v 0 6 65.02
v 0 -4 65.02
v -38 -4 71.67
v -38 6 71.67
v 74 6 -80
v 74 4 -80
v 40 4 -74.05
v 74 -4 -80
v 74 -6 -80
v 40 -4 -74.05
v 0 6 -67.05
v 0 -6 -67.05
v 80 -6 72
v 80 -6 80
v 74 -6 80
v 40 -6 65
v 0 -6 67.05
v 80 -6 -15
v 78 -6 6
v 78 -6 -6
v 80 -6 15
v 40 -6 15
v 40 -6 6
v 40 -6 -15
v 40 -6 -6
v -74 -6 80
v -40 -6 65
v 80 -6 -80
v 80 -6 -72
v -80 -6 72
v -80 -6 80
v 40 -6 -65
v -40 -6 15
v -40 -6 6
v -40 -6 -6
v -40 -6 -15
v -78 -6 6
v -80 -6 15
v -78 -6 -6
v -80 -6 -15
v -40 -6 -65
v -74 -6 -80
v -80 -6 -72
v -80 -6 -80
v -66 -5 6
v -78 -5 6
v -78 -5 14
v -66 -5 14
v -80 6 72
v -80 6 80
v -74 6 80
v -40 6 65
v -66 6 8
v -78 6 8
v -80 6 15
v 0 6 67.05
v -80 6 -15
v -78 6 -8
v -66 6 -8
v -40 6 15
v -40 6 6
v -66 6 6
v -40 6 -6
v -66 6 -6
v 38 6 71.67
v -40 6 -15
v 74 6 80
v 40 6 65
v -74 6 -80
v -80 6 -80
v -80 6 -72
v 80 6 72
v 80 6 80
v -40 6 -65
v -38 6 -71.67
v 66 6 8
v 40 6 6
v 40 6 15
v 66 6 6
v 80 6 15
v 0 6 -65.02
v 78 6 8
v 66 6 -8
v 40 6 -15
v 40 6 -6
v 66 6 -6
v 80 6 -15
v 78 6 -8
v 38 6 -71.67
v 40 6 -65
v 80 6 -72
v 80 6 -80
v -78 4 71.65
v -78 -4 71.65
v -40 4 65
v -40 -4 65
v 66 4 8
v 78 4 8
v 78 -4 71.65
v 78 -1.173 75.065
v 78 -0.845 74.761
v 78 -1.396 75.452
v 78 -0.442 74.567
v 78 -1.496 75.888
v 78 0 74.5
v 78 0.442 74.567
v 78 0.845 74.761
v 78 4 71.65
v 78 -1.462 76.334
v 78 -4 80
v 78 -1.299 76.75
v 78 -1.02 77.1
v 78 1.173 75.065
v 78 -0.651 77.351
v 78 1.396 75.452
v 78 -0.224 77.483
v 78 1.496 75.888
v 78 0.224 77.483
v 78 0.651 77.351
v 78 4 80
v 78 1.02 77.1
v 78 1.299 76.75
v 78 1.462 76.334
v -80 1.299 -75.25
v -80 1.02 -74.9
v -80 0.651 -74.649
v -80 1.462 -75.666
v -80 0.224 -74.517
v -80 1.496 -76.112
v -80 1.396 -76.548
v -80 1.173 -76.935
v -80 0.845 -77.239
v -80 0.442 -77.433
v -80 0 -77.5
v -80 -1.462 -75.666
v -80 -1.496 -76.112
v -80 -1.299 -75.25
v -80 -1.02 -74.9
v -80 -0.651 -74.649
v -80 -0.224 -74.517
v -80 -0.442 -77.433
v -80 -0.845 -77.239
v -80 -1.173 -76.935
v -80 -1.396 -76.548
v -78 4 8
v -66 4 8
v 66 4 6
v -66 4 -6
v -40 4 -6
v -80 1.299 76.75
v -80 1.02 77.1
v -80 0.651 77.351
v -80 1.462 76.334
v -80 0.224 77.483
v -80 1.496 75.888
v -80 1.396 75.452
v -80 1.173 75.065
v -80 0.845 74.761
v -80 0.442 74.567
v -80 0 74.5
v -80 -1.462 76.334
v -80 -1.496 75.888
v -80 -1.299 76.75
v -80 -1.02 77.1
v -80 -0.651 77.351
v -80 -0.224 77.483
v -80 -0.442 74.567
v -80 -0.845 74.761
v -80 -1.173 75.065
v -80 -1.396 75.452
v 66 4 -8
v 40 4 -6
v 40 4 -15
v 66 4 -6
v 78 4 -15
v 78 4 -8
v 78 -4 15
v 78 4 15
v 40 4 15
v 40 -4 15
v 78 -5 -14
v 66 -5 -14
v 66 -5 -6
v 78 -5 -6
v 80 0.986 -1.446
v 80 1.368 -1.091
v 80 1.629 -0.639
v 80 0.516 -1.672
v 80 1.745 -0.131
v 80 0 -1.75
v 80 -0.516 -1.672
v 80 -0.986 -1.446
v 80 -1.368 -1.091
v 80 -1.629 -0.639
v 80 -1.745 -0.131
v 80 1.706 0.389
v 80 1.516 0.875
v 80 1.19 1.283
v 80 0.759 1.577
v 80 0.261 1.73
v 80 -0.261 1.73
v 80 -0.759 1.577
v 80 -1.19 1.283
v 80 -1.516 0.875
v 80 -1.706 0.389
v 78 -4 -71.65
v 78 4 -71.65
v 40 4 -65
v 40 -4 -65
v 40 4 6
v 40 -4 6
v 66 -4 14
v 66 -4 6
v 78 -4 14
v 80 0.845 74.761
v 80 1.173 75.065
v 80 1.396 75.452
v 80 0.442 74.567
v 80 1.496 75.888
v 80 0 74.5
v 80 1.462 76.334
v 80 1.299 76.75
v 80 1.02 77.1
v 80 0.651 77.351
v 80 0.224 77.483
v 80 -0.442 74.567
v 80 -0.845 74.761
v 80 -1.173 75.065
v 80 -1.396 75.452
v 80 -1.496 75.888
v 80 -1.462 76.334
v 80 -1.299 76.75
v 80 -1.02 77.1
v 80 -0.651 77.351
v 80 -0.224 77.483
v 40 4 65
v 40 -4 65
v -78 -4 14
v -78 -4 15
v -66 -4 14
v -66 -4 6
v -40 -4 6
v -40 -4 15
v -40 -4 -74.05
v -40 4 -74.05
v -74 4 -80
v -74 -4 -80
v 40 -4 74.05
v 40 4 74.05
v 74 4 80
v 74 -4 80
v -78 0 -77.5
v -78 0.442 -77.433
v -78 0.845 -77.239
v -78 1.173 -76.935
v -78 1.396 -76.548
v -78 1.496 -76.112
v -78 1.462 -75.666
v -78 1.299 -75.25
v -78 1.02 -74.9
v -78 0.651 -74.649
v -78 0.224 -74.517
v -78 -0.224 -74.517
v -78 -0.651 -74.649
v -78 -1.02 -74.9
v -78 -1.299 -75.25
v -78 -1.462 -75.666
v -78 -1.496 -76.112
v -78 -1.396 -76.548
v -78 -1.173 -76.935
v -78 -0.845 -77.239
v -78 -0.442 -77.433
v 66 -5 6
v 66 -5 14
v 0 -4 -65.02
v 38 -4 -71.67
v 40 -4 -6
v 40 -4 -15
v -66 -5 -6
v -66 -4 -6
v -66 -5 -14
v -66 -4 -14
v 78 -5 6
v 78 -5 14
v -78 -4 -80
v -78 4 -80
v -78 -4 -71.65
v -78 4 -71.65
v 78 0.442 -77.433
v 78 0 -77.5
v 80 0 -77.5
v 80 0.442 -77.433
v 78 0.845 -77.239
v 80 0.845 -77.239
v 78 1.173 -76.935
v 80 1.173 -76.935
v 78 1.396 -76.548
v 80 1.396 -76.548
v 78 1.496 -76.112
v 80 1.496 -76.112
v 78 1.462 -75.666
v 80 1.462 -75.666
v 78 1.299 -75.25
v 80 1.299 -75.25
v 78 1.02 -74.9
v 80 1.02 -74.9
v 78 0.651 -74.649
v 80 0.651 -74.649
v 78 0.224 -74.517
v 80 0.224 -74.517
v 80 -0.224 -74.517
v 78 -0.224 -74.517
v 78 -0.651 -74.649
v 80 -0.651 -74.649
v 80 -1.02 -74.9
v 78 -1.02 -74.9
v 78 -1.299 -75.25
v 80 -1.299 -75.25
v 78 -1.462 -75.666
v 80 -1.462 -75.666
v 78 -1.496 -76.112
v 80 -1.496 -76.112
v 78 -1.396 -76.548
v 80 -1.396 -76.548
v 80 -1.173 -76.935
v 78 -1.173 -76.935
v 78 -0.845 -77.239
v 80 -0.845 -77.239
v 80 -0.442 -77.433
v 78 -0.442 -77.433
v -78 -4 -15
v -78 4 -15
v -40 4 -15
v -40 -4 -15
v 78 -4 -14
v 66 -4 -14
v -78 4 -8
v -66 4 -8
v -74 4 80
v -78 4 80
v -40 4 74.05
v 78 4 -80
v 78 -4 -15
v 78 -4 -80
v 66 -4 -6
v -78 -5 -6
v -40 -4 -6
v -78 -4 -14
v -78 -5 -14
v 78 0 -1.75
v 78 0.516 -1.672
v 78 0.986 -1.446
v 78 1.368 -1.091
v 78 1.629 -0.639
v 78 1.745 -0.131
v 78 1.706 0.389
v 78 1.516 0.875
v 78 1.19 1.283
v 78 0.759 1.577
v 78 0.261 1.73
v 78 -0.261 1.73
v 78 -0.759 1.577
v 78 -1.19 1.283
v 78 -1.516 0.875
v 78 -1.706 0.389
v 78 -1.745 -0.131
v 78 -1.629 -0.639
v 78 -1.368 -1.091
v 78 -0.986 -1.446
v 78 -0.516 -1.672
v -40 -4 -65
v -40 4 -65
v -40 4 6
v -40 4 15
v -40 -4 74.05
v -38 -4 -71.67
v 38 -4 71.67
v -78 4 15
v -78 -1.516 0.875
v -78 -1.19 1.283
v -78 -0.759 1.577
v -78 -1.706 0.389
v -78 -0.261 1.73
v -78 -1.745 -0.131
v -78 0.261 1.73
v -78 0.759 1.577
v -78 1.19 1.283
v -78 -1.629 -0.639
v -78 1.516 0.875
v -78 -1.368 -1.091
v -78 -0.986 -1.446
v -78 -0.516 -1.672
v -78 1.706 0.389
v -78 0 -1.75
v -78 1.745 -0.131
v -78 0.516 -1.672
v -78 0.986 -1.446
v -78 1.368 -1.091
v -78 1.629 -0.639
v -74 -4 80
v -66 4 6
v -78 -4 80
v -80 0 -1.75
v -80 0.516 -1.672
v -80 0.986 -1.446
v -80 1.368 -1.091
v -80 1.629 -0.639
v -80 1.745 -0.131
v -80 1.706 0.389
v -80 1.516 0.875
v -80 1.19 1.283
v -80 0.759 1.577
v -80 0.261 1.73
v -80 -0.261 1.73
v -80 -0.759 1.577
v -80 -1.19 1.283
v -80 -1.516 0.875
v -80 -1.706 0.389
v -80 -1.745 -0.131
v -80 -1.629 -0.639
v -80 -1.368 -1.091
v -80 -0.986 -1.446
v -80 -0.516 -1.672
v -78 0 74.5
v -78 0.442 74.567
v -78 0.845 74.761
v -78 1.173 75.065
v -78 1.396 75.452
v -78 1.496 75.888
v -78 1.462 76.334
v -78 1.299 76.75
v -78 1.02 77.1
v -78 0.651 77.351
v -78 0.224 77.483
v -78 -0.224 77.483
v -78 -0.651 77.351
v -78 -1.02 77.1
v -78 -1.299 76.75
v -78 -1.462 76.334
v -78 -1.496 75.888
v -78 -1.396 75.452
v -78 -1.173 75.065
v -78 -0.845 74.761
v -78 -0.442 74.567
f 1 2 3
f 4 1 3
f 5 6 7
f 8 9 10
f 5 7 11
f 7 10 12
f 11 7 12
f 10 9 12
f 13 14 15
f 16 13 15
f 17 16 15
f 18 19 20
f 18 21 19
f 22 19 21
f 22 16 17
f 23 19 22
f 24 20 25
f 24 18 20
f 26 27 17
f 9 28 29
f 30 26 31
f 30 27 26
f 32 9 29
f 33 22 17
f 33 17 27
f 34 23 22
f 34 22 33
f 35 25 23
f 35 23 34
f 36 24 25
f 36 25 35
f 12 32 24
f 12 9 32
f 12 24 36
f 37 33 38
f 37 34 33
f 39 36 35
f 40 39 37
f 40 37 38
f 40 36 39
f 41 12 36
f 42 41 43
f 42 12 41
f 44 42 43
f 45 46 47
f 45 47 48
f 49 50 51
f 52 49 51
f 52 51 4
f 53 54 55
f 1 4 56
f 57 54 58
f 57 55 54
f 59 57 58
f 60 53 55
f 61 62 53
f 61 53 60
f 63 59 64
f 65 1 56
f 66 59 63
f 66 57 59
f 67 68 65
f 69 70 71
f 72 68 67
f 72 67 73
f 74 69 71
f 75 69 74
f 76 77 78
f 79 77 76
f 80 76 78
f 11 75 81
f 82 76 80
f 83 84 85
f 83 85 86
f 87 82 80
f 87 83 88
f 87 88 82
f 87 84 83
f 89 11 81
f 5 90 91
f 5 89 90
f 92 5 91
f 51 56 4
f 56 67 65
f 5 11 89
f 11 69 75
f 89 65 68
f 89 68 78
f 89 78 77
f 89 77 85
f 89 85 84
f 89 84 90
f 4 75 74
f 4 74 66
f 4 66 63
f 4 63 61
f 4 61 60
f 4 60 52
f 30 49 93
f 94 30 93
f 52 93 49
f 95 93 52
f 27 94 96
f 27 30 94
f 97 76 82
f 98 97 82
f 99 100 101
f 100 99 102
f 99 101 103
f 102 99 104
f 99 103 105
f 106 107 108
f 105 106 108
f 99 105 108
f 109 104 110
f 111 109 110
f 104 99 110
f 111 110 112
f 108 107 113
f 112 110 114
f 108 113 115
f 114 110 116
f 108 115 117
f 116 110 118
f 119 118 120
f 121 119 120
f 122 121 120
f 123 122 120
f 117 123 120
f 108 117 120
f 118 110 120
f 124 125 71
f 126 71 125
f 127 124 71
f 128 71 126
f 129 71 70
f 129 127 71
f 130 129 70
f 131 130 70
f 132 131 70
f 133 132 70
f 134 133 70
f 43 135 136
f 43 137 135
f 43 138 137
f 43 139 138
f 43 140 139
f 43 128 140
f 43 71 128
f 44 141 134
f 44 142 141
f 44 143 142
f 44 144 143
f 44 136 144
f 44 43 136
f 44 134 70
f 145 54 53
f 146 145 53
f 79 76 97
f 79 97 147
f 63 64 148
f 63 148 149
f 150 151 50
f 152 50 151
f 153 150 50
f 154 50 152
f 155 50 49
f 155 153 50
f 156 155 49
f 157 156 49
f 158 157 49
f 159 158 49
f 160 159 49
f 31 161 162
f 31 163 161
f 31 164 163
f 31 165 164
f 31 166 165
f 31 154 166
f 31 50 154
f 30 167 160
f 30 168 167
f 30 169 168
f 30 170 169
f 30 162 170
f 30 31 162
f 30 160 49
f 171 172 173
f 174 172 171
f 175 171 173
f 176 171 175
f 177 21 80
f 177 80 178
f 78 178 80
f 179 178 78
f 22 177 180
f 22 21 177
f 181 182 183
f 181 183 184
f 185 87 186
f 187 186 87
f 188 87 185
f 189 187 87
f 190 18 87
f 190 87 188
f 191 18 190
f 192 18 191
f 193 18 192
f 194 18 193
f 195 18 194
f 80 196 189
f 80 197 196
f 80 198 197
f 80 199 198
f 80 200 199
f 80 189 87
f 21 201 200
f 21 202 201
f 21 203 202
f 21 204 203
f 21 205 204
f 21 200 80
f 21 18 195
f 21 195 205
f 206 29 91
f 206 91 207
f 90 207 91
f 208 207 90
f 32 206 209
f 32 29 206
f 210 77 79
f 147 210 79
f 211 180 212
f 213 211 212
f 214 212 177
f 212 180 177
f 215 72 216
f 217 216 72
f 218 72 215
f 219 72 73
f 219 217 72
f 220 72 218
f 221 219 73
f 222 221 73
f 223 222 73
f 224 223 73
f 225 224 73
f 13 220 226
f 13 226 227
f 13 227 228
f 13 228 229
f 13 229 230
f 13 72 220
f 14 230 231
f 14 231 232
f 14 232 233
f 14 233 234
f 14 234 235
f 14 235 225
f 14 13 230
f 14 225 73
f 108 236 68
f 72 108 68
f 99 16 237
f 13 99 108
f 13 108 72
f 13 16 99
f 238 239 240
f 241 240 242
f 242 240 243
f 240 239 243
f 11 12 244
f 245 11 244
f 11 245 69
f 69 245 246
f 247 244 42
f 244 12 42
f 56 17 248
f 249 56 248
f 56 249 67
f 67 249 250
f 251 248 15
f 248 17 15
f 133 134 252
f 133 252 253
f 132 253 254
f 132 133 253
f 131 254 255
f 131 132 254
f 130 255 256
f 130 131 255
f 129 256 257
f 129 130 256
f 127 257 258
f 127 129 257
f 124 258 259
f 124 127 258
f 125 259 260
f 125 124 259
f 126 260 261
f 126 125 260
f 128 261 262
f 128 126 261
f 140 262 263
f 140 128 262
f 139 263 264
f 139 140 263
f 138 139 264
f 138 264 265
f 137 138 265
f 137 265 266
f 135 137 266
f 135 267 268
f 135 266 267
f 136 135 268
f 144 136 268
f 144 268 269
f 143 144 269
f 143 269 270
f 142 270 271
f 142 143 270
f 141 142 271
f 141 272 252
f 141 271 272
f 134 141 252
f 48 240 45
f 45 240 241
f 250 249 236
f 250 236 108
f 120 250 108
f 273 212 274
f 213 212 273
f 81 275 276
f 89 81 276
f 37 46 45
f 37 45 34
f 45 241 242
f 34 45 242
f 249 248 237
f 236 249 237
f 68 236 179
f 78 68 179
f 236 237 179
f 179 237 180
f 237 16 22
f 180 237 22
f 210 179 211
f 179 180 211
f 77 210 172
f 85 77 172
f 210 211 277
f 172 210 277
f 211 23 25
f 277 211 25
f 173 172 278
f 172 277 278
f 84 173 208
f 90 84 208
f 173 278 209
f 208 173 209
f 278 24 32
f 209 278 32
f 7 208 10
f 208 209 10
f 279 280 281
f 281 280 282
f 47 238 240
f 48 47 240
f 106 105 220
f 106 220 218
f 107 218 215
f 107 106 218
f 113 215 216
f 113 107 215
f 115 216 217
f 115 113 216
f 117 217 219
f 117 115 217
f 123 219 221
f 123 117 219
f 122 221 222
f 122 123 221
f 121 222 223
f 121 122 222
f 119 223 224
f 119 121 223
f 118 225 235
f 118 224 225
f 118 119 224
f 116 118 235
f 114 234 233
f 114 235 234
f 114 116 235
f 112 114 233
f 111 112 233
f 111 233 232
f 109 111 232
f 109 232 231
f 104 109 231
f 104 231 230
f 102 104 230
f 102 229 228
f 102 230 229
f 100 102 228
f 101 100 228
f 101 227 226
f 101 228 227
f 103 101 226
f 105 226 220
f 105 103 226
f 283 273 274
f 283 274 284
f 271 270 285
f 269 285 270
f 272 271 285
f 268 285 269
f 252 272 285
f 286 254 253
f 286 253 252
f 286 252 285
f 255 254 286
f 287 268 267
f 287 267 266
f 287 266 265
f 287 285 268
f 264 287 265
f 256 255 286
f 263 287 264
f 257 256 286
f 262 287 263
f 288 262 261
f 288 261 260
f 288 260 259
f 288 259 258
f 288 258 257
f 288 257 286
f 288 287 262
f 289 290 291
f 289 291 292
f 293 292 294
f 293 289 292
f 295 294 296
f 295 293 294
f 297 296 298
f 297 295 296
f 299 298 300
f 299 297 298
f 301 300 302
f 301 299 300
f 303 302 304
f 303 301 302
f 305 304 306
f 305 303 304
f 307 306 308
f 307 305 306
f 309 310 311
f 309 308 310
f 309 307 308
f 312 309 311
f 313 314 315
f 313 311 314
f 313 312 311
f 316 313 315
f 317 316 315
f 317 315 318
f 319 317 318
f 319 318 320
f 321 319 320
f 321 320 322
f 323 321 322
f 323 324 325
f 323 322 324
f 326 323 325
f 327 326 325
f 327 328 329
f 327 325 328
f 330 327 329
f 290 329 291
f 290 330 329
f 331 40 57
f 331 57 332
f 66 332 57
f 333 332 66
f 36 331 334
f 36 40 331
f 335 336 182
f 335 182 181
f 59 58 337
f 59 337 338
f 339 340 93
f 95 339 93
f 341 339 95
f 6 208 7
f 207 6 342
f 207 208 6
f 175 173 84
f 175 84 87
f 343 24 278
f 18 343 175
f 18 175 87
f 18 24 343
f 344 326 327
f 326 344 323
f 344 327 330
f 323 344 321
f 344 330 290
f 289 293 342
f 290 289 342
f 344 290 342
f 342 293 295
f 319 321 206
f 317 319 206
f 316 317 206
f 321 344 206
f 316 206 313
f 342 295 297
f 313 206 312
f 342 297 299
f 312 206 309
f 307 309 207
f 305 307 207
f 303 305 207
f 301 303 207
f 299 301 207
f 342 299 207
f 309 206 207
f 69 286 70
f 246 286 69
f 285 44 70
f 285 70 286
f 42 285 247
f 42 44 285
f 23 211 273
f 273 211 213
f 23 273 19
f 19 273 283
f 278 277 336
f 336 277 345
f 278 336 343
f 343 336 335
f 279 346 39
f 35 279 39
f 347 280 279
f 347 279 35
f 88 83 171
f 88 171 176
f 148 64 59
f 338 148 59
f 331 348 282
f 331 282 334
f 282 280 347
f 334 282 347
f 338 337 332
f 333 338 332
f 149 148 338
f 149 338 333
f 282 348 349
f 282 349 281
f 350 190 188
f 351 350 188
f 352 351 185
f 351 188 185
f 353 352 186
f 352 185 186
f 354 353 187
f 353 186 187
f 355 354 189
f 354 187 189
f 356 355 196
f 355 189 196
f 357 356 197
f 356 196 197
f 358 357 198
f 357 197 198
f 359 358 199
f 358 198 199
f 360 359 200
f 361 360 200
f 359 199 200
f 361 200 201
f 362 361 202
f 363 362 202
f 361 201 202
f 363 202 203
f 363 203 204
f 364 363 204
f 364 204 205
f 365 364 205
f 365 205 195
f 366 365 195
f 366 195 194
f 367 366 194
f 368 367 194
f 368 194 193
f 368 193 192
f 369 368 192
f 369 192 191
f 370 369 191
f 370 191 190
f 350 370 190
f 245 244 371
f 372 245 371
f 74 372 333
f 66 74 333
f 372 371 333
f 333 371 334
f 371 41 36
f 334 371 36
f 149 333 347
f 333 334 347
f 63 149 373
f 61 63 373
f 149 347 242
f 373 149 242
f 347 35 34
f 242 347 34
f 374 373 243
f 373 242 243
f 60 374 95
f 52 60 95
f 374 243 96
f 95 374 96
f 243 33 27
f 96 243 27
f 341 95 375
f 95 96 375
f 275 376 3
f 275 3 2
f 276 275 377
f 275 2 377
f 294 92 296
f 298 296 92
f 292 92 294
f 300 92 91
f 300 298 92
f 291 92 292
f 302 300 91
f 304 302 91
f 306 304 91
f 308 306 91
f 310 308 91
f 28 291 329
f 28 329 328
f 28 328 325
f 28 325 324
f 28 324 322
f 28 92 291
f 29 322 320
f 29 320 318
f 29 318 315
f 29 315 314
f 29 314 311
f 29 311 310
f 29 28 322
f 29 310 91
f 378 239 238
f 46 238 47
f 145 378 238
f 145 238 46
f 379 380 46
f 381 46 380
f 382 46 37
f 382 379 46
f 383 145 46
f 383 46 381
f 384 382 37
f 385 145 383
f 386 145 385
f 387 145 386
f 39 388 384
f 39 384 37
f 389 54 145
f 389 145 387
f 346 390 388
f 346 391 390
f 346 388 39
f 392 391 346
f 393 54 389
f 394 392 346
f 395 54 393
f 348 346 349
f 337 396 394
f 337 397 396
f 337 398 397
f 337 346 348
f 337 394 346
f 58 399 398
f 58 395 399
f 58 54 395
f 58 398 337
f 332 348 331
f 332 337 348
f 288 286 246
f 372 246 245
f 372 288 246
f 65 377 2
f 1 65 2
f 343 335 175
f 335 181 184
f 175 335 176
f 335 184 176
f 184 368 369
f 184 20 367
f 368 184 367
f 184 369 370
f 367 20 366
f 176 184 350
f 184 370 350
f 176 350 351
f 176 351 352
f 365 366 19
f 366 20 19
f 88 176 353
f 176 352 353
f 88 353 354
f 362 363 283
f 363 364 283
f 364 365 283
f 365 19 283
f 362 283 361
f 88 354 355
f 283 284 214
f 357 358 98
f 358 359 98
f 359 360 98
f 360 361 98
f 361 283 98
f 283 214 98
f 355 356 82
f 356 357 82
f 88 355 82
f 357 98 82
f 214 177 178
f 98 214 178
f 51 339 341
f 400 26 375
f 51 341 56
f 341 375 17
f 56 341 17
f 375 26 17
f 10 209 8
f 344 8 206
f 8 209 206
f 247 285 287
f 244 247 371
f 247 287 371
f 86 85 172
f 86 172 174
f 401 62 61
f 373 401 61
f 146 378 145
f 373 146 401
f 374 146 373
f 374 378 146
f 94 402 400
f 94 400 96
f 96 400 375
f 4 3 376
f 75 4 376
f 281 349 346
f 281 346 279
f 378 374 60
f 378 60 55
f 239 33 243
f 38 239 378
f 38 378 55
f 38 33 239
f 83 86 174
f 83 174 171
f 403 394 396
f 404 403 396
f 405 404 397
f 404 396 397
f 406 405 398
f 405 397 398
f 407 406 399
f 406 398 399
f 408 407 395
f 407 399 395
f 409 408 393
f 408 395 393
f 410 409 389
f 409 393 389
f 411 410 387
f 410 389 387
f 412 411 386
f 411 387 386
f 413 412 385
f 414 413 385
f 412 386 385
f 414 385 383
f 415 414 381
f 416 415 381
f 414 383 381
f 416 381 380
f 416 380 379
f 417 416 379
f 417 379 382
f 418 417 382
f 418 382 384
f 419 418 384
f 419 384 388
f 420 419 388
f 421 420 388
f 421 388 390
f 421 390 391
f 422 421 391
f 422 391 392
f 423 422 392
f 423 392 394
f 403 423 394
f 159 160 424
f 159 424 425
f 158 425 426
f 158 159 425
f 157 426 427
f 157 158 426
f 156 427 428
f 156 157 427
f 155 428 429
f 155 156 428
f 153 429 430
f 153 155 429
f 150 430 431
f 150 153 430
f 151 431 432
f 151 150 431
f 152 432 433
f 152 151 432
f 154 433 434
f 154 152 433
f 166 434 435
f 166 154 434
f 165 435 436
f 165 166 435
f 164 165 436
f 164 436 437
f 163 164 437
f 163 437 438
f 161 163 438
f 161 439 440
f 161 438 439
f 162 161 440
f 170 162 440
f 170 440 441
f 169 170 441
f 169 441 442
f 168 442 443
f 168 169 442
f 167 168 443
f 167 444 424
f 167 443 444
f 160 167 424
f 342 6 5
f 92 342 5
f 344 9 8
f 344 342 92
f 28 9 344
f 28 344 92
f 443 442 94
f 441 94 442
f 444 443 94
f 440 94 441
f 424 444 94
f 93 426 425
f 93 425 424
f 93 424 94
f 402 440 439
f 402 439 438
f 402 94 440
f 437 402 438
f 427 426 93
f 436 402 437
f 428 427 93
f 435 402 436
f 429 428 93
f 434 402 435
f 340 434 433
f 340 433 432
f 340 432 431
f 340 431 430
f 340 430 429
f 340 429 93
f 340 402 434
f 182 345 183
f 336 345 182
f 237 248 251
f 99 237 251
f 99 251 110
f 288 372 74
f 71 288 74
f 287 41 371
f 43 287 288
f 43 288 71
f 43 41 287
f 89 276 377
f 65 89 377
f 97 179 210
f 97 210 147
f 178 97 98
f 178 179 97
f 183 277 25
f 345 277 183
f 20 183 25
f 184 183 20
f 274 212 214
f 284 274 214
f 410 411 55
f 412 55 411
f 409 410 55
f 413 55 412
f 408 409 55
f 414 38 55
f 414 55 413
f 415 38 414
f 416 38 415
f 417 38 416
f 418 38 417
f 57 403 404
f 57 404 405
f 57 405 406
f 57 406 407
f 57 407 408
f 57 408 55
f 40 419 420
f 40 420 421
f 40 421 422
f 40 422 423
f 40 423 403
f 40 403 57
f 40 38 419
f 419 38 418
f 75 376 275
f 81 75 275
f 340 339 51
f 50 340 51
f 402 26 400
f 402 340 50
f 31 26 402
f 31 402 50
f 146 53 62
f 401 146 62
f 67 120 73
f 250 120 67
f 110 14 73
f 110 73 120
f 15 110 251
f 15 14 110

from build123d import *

# Parameters (mm, degrees)
BOSS_EXTRUDE1_DEPTH      = 6
BOSS_EXTRUDE1_DEPTH_BACK = 6
SKETCH2_W                = 156
SKETCH2_H                = 8
CUT_EXTRUDE1_DEPTH       = 160
SKETCH4_W                = 38
SKETCH4_H                = 12
CUT_EXTRUDE2_DEPTH       = 12
CUT_EXTRUDE3_DEPTH       = 114.296072306
CUT_EXTRUDE3_DEPTH_BACK  = 114.296072306
SKETCH6_R                = 1.5
CUT_EXTRUDE4_REACH       = 180.986
SKETCH7_R                = 1.75
SKETCH8_W                = 12
SKETCH8_H                = 16
CUT_EXTRUDE5_DEPTH       = 2
SKETCH9_W                = 12
SKETCH9_H                = 28
CUT_EXTRUDE6_DEPTH       = 1
CUT_EXTRUDE7_DEPTH       = 2
BOSS_EXTRUDE2_DEPTH      = 10


with BuildPart() as part:
    # Sketch1 → Boss-Extrude1 (new, two sides: drawn at the far end of the back side and taken through both)
    with BuildSketch(Plane(origin=(0, 0, 0), x_dir=(1, 0, 0), z_dir=(0, 1, 0)).offset(-BOSS_EXTRUDE1_DEPTH_BACK)):
        Polygon((80, 15), (80, -15), (40, -15), (40, -65), (80, -72), (80, -80), (74, -80), (0, -67.05), (-74, -80), (-80, -80), (-80, -72), (-40, -65), (-40, -15), (-80, -15), (-80, 15), (-40, 15), (-40, 65), (-80, 72), (-80, 80), (-74, 80), (0, 67.05), (74, 80), (80, 80), (80, 72), (40, 65), (40, 15), align=None)
    extrude(amount=BOSS_EXTRUDE1_DEPTH + BOSS_EXTRUDE1_DEPTH_BACK)

    # Sketch2 → Cut-Extrude1 (cut)
    with BuildSketch(Plane.XY.offset(80)):
        Rectangle(SKETCH2_W, SKETCH2_H)
    extrude(amount=-CUT_EXTRUDE1_DEPTH, mode=Mode.SUBTRACT)

    # Sketch4 → Cut-Extrude2 (cut)
    with BuildSketch(Plane(origin=(0, 6, 0), x_dir=(1, 0, 0), z_dir=(0, 1, 0))):
        with Locations((-59, 0)):
            Rectangle(SKETCH4_W, SKETCH4_H)
        with Locations((59, 0)):
            Rectangle(SKETCH4_W, SKETCH4_H)
    extrude(amount=-CUT_EXTRUDE2_DEPTH, mode=Mode.SUBTRACT)

    # Sketch6 → Cut-Extrude3 (cut, two sides: drawn at the far end of the back side and taken through both)
    with BuildSketch(Plane(origin=(0, 0, 0), x_dir=(0, 0, -1), z_dir=(1, 0, 0)).offset(-CUT_EXTRUDE3_DEPTH_BACK)):
        with Locations((-76, 0)):
            Circle(SKETCH6_R)
        with Locations((76, 0)):
            Circle(SKETCH6_R)
    extrude(amount=CUT_EXTRUDE3_DEPTH + CUT_EXTRUDE3_DEPTH_BACK, mode=Mode.SUBTRACT)

    # Cut-Extrude4: up to this face of the body (flat: up to its plane)
    cut_extrude4_end = Plane(part.part.faces().sort_by_distance((-80, 0, 0))[0])
    # Sketch7 → Cut-Extrude4 (cut, up to the picked face)
    with BuildSketch(Plane(origin=(80, 0, 0), x_dir=(0, 0, -1), z_dir=(1, 0, 0)), mode=Mode.PRIVATE) as cut_extrude4_sk1:
        Circle(SKETCH7_R)
    cut_extrude4_tool1 = split(extrude(cut_extrude4_sk1.sketch, amount=-CUT_EXTRUDE4_REACH, mode=Mode.PRIVATE), bisect_by=cut_extrude4_end, keep=Keep.BOTH, mode=Mode.PRIVATE)
    add(cut_extrude4_tool1.solids().sort_by(Axis((80, 0, 0), (-1, 0, 0)))[0], mode=Mode.SUBTRACT)

    # Sketch8 → Cut-Extrude5 (cut)
    with BuildSketch(Plane(origin=(0, 6, 0), x_dir=(1, 0, 0), z_dir=(0, 1, 0))):
        with Locations((72, 0)):
            Rectangle(SKETCH8_W, SKETCH8_H)
        with Locations((-72, 0)):
            Rectangle(SKETCH8_W, SKETCH8_H)
    extrude(amount=-CUT_EXTRUDE5_DEPTH, mode=Mode.SUBTRACT)

    # Sketch9 → Cut-Extrude6 (cut)
    with BuildSketch(Plane(origin=(0, -4, 0), x_dir=(1, 0, 0), z_dir=(0, 1, 0))):
        with Locations((72, 0)):
            Rectangle(SKETCH9_W, SKETCH9_H)
        with Locations((-72, 0)):
            Rectangle(SKETCH9_W, SKETCH9_H)
    extrude(amount=-CUT_EXTRUDE6_DEPTH, mode=Mode.SUBTRACT)

    # Sketch11 → Cut-Extrude7 (cut)
    with BuildSketch(Plane(origin=(0, 6, 0), x_dir=(1, 0, 0), z_dir=(0, 1, 0))):
        Polygon((-40, -74.05), (-40, 74.05), (0, 67.05), (40, 74.05), (40, -74.05), (0, -67.05), align=None)
    extrude(amount=-CUT_EXTRUDE7_DEPTH, mode=Mode.SUBTRACT)

    # Sketch12 → Boss-Extrude2 (add)
    with BuildSketch(Plane(origin=(0, -4, 0), x_dir=(1, 0, 0), z_dir=(0, 1, 0))):
        Polygon((-40, 74.05), (-40, -74.05), (0, -67.05), (40, -74.05), (40, 74.05), (0, 67.05), align=None)
        Polygon((0, 65.01960595), (38, 71.66960595), (38, -71.66960595), (0, -65.01960595), (-38, -71.66960595), (-38, 71.66960595), align=None, mode=Mode.SUBTRACT)
    extrude(amount=BOSS_EXTRUDE2_DEPTH)


solid = part.part
